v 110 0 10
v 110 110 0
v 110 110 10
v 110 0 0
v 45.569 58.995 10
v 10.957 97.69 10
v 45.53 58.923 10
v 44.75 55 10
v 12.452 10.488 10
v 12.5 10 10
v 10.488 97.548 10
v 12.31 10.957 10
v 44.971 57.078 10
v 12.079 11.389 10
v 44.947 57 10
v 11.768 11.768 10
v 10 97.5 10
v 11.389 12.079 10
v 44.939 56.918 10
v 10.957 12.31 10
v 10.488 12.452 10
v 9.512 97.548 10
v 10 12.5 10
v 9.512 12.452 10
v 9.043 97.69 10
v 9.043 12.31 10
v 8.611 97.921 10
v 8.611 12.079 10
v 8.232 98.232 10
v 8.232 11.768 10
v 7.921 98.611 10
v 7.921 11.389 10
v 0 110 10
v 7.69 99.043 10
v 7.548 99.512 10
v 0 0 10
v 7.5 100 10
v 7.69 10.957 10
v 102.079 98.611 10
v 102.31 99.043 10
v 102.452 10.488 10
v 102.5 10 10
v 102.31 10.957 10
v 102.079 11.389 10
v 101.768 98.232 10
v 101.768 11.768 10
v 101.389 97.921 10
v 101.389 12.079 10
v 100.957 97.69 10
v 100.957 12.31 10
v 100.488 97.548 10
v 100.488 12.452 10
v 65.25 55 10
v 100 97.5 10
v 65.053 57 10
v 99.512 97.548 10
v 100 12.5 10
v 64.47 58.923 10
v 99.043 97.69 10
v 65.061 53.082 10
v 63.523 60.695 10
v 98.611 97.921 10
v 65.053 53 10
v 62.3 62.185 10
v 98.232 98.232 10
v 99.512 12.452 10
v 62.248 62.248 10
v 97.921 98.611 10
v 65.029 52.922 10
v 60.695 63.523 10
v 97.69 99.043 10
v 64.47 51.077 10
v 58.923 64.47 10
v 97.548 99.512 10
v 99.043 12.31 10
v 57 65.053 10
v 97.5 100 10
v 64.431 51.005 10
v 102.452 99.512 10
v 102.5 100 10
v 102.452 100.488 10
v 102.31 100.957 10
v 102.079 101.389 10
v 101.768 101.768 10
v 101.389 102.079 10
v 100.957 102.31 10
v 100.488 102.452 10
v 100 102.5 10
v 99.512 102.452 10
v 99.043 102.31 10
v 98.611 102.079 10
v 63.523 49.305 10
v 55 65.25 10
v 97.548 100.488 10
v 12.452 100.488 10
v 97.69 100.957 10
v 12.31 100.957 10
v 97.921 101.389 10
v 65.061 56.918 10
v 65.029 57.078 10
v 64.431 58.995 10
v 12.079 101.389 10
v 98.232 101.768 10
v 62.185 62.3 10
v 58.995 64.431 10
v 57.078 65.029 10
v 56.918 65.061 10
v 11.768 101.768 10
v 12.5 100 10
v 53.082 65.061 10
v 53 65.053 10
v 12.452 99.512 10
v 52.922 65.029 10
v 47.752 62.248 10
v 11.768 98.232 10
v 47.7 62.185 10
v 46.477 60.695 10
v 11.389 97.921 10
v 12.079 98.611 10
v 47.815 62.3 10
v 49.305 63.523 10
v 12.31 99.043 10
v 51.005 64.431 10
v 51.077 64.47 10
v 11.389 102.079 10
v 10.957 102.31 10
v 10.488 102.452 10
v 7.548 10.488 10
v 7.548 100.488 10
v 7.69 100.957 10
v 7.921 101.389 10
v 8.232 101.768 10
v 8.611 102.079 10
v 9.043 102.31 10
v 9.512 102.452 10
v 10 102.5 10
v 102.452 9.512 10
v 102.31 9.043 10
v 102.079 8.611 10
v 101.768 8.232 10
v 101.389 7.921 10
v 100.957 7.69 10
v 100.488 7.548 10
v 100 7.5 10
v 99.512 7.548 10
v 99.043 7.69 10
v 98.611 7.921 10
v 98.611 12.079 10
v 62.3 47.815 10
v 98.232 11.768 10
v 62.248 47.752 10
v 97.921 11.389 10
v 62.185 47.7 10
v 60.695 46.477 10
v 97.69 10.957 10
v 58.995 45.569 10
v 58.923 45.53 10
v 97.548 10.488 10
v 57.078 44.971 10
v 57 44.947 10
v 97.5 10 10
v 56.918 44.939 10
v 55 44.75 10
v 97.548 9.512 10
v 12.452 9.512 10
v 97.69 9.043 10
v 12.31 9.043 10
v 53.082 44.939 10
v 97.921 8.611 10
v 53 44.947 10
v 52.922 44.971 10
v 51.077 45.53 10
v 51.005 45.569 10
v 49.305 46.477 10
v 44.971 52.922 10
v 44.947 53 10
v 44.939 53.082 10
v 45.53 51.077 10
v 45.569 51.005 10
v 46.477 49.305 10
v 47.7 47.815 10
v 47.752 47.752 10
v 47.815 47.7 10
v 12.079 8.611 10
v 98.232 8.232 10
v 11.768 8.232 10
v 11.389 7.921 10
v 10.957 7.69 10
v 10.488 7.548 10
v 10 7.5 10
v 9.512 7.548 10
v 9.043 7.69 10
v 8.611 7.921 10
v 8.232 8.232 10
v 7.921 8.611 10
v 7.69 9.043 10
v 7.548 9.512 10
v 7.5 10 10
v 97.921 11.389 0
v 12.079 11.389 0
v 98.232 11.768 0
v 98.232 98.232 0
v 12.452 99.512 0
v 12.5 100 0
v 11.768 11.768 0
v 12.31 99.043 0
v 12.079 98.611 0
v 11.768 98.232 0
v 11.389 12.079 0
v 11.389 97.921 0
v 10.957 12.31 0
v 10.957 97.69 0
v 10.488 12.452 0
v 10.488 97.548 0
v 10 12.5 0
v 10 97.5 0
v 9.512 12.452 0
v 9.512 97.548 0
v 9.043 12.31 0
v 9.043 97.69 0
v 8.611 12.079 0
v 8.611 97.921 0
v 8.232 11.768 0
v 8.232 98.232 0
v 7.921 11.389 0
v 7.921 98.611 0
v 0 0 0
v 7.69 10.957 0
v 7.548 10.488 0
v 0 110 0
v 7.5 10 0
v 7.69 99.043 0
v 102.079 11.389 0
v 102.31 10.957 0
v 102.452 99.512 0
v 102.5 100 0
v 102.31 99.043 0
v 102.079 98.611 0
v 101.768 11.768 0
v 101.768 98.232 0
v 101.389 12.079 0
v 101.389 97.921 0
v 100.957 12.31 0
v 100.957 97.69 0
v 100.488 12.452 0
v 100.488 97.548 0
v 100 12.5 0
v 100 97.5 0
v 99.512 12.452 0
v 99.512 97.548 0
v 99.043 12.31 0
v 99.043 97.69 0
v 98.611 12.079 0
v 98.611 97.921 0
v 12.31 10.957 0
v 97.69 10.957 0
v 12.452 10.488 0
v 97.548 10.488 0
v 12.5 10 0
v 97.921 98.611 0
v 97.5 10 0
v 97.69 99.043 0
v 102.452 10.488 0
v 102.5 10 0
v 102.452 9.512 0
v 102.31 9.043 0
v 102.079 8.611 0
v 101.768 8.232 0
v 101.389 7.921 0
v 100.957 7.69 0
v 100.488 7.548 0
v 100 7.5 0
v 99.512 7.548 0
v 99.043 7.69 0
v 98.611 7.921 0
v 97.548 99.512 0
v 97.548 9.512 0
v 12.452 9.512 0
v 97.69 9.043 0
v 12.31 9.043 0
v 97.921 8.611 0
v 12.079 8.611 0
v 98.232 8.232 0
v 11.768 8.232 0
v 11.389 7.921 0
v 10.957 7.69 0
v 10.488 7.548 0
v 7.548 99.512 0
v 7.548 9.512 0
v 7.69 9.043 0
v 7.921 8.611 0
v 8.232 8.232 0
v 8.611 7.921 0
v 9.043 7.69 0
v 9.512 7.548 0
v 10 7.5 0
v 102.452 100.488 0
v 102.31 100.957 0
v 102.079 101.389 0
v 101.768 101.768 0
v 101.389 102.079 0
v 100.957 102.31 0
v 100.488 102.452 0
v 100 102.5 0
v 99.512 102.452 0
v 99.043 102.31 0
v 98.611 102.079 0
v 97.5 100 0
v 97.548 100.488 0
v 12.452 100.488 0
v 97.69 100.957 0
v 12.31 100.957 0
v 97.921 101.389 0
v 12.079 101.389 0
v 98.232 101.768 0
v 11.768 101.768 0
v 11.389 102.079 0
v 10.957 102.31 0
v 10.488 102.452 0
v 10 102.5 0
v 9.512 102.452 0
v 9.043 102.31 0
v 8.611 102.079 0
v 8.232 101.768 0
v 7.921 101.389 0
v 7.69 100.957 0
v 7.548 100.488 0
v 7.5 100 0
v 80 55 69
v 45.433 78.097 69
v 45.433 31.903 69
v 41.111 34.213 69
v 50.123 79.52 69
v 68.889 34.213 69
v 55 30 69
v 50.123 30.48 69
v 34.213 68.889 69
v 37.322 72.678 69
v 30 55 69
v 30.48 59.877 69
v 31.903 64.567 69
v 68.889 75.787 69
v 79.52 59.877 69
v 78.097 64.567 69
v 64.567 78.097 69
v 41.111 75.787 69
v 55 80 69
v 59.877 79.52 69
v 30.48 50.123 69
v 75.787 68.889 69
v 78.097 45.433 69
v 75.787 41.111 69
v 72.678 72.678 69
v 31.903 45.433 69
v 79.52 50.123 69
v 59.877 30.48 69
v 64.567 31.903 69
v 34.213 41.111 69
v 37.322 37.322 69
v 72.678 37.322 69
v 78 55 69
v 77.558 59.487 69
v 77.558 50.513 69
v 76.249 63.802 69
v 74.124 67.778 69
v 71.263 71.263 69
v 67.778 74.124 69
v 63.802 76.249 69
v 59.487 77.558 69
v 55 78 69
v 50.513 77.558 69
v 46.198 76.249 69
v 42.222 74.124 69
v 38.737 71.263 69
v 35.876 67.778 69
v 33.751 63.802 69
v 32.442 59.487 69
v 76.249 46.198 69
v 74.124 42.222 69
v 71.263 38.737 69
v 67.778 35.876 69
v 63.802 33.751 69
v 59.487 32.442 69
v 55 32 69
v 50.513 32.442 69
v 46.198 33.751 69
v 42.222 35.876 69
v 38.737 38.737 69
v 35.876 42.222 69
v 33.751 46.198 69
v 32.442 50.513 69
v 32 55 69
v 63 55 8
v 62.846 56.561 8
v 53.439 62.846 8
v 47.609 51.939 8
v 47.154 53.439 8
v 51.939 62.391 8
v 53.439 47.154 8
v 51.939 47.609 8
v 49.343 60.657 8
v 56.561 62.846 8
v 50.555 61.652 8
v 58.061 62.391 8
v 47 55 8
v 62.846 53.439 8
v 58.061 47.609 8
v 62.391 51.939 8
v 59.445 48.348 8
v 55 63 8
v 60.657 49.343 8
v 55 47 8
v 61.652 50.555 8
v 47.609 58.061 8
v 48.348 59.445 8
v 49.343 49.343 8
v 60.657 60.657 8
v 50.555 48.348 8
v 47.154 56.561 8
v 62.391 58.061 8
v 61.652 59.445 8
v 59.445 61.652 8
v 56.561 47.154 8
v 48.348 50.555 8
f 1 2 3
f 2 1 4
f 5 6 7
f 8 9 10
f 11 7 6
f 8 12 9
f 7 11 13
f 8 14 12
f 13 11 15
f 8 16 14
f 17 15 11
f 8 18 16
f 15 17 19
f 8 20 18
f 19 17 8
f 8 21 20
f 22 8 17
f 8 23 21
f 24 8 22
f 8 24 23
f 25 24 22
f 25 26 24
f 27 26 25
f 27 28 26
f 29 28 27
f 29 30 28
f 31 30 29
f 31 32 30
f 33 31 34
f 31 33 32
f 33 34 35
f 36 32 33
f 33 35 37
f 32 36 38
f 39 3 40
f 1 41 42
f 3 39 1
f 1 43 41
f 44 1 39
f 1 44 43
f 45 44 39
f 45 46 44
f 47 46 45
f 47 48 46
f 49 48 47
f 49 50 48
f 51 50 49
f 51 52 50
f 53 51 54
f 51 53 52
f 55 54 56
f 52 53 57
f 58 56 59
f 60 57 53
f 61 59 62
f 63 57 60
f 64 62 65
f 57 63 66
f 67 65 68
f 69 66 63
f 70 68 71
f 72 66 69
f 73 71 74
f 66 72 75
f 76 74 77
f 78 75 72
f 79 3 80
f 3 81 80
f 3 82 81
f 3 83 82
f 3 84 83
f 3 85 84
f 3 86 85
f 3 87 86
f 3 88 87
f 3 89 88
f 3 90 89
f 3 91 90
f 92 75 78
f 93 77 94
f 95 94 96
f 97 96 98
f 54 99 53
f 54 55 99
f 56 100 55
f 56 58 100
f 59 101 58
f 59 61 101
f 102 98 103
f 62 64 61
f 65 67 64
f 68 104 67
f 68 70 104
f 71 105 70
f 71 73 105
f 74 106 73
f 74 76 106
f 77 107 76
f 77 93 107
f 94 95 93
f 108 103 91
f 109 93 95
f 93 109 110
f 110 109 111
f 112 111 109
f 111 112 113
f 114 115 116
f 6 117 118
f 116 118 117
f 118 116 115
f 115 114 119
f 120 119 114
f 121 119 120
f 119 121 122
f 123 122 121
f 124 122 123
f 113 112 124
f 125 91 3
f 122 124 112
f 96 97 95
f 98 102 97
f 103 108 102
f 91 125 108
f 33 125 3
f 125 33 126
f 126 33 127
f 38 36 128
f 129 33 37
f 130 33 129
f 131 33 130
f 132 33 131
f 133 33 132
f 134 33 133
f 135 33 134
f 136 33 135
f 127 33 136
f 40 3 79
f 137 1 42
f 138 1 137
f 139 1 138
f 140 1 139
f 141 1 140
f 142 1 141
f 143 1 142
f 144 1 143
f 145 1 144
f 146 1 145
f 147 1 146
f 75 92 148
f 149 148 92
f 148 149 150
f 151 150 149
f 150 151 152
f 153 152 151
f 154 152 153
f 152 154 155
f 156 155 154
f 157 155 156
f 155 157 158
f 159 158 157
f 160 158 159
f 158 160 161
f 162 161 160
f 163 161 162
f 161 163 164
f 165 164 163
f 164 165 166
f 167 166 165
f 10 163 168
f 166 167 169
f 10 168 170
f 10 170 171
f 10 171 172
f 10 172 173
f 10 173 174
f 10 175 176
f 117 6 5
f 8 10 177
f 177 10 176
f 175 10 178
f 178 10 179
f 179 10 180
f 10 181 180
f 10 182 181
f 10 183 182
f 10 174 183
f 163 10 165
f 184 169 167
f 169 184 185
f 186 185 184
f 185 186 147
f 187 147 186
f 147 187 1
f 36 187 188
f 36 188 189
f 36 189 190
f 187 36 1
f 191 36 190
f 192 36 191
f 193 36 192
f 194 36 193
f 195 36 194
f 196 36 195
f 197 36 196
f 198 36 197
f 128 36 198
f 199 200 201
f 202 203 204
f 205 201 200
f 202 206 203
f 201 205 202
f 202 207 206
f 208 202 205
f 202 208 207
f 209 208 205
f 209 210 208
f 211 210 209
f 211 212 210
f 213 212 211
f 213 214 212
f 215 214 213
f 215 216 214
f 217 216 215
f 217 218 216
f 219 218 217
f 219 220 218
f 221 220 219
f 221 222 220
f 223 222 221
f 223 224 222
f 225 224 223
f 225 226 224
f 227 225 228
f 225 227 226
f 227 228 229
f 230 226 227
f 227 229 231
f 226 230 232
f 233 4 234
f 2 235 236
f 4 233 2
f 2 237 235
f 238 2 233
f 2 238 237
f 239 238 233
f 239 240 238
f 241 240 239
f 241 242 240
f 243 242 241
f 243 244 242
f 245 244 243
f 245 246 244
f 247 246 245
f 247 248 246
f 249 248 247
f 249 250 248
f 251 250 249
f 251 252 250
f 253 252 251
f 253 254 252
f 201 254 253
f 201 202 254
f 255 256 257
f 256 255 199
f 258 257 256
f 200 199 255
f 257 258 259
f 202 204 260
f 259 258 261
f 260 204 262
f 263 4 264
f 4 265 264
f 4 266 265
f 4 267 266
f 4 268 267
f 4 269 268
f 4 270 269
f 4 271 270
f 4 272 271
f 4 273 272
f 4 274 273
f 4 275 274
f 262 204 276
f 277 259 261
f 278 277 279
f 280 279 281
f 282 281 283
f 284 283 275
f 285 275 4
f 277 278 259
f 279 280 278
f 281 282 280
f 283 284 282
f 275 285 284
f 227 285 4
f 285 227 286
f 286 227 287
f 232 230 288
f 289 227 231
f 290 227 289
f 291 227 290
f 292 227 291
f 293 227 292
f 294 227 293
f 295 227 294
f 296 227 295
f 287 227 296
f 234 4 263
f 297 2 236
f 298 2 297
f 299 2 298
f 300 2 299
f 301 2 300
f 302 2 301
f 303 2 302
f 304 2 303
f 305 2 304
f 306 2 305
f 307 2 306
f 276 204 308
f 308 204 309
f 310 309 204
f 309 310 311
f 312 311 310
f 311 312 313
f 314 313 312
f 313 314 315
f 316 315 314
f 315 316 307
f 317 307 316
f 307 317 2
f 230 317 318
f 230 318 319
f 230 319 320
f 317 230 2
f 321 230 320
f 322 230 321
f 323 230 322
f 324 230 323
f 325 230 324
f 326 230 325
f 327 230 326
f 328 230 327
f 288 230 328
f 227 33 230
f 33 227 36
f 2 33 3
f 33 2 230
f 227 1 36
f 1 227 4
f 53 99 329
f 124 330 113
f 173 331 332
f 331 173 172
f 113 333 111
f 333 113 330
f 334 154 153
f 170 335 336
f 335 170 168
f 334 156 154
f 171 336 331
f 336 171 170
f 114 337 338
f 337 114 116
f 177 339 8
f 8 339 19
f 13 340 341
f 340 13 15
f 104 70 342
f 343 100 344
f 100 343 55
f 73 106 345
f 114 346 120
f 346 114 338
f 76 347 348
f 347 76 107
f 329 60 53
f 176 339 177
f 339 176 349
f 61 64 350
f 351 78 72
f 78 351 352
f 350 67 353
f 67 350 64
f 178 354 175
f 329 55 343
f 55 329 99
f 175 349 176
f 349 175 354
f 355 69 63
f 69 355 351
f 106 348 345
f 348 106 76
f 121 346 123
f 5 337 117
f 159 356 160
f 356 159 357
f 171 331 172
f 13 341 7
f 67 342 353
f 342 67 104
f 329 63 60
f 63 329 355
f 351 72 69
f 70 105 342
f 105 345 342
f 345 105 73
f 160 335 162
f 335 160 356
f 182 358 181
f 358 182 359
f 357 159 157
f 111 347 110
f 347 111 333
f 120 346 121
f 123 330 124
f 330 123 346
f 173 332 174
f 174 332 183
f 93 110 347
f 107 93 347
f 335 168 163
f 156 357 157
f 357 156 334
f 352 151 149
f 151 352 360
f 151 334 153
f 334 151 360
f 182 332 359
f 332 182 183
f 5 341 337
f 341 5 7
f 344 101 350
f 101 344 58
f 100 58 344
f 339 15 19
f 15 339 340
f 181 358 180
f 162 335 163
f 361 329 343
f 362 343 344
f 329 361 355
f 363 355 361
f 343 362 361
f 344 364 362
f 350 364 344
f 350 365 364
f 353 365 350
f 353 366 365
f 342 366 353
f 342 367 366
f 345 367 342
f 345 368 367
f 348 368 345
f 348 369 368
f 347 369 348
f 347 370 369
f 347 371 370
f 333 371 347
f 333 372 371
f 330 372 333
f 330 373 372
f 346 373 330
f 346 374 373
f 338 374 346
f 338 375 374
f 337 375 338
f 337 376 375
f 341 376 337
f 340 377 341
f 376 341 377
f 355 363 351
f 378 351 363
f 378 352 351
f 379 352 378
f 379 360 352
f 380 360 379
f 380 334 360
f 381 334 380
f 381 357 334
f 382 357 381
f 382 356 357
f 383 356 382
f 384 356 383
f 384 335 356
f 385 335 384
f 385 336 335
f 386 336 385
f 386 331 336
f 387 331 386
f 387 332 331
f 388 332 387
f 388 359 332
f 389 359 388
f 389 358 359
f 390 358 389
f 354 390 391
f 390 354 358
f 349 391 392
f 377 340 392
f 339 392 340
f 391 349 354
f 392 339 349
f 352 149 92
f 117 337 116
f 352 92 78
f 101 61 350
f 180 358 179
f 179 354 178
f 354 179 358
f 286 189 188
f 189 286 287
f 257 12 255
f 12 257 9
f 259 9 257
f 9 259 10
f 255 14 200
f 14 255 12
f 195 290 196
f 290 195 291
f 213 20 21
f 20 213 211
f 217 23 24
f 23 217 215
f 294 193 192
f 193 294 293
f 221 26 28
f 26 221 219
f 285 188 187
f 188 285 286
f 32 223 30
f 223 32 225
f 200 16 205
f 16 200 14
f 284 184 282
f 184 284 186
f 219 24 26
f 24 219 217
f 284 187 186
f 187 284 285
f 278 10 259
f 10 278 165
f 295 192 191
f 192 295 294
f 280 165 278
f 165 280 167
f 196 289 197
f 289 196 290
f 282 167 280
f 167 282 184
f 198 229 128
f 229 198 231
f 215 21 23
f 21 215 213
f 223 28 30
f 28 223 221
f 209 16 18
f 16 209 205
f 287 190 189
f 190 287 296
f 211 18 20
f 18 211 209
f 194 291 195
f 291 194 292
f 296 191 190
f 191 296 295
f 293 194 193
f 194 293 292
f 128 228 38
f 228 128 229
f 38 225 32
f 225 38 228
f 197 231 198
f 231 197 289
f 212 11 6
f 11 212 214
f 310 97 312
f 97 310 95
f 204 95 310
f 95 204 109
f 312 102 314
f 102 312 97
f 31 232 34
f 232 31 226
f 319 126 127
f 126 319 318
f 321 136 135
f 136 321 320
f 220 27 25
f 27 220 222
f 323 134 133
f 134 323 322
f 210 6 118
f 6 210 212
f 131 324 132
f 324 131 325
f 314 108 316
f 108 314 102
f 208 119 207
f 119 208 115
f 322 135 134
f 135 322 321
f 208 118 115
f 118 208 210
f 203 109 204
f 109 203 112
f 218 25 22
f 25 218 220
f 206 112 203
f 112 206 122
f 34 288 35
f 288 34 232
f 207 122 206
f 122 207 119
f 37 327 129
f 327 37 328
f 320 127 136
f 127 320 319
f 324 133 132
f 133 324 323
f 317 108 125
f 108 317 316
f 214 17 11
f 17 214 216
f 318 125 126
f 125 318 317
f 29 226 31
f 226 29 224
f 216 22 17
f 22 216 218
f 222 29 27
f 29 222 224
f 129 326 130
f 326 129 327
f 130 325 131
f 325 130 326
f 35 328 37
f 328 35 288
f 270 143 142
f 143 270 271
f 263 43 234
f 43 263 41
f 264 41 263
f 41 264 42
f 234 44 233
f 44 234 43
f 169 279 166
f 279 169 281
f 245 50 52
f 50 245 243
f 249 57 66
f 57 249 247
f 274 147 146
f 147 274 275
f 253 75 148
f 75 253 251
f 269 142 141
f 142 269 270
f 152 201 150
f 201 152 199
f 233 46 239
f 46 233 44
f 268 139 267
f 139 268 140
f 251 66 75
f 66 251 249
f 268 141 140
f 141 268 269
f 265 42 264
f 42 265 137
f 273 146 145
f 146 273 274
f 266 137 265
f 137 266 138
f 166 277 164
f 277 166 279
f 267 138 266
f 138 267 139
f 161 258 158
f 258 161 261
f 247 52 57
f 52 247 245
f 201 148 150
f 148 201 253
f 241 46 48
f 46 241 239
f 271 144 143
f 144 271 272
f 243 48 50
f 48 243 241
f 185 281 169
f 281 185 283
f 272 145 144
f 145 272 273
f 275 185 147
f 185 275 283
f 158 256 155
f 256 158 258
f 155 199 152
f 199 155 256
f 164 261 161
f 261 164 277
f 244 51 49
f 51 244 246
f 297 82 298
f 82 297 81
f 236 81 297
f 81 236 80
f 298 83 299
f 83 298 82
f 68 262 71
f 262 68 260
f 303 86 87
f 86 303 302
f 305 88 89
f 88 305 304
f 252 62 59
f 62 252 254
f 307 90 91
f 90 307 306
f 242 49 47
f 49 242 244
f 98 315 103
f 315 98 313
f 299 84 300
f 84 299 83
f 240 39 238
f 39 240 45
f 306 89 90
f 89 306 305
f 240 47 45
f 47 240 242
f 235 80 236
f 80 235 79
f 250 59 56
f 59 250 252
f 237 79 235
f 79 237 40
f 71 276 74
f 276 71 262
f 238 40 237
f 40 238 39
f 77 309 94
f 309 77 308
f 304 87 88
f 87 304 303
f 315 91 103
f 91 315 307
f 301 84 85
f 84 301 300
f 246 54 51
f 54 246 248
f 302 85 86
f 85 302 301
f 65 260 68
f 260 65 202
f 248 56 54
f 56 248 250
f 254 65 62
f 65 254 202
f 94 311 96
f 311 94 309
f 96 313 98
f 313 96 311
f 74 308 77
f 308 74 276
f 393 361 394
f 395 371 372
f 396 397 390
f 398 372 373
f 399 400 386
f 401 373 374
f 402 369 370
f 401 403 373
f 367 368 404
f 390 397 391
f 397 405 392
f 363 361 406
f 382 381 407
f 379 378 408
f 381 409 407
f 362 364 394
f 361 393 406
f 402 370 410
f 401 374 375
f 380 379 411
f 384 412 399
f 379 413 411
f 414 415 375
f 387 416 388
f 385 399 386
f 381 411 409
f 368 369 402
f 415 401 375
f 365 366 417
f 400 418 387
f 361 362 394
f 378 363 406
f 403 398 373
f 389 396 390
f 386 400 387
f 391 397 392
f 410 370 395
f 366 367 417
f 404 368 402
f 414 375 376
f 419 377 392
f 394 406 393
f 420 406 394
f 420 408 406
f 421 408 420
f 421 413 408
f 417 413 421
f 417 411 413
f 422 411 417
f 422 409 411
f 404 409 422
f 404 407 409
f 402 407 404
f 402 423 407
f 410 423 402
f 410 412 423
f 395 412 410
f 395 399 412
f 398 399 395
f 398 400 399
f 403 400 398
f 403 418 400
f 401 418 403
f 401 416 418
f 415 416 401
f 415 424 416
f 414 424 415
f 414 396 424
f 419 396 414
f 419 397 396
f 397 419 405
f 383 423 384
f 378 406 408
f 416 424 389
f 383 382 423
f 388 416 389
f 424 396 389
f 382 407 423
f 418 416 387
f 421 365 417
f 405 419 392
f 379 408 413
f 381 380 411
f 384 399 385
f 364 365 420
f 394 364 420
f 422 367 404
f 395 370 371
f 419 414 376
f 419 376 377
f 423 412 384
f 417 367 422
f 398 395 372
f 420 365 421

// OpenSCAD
$fn = 32;

// ----------------------------------------------------------------------
// Hopper: flanged with square flange
// ----------------------------------------------------------------------

// --- parameters (mm) ---
fl = 110;                 // flange side, X and Y
fl_t = 10;                // flange thickness
cone_h = 60;              // cone height above the flange
top_d = 50;               // cone mouth diameter
bot_d = 20;               // cone spout diameter
wall = 2;                 // cone wall thickness
hole_r = 2.5;             // flange hole radius
hole_in = 10;             // hole inset from the corners

bore_d = bot_d - 2 * wall;  // spout bore diameter
total_h = fl_t + cone_h - 1;  // overall height

difference() {
  union() {
    cube([fl, fl, fl_t]);
    translate([fl / 2, fl / 2, fl_t - 1])
      cylinder(h = cone_h, d1 = bot_d, d2 = top_d);
  }
  translate([fl / 2, fl / 2, fl_t - 2])
    cylinder(h = cone_h + 1, d1 = bore_d, d2 = top_d - 2 * wall);
  for (sx = [0, 1], sy = [0, 1])
    translate([sx ? fl - hole_in : hole_in,
               sy ? fl - hole_in : hole_in, -1])
      cylinder(r = hole_r, h = fl_t + 2);
}
